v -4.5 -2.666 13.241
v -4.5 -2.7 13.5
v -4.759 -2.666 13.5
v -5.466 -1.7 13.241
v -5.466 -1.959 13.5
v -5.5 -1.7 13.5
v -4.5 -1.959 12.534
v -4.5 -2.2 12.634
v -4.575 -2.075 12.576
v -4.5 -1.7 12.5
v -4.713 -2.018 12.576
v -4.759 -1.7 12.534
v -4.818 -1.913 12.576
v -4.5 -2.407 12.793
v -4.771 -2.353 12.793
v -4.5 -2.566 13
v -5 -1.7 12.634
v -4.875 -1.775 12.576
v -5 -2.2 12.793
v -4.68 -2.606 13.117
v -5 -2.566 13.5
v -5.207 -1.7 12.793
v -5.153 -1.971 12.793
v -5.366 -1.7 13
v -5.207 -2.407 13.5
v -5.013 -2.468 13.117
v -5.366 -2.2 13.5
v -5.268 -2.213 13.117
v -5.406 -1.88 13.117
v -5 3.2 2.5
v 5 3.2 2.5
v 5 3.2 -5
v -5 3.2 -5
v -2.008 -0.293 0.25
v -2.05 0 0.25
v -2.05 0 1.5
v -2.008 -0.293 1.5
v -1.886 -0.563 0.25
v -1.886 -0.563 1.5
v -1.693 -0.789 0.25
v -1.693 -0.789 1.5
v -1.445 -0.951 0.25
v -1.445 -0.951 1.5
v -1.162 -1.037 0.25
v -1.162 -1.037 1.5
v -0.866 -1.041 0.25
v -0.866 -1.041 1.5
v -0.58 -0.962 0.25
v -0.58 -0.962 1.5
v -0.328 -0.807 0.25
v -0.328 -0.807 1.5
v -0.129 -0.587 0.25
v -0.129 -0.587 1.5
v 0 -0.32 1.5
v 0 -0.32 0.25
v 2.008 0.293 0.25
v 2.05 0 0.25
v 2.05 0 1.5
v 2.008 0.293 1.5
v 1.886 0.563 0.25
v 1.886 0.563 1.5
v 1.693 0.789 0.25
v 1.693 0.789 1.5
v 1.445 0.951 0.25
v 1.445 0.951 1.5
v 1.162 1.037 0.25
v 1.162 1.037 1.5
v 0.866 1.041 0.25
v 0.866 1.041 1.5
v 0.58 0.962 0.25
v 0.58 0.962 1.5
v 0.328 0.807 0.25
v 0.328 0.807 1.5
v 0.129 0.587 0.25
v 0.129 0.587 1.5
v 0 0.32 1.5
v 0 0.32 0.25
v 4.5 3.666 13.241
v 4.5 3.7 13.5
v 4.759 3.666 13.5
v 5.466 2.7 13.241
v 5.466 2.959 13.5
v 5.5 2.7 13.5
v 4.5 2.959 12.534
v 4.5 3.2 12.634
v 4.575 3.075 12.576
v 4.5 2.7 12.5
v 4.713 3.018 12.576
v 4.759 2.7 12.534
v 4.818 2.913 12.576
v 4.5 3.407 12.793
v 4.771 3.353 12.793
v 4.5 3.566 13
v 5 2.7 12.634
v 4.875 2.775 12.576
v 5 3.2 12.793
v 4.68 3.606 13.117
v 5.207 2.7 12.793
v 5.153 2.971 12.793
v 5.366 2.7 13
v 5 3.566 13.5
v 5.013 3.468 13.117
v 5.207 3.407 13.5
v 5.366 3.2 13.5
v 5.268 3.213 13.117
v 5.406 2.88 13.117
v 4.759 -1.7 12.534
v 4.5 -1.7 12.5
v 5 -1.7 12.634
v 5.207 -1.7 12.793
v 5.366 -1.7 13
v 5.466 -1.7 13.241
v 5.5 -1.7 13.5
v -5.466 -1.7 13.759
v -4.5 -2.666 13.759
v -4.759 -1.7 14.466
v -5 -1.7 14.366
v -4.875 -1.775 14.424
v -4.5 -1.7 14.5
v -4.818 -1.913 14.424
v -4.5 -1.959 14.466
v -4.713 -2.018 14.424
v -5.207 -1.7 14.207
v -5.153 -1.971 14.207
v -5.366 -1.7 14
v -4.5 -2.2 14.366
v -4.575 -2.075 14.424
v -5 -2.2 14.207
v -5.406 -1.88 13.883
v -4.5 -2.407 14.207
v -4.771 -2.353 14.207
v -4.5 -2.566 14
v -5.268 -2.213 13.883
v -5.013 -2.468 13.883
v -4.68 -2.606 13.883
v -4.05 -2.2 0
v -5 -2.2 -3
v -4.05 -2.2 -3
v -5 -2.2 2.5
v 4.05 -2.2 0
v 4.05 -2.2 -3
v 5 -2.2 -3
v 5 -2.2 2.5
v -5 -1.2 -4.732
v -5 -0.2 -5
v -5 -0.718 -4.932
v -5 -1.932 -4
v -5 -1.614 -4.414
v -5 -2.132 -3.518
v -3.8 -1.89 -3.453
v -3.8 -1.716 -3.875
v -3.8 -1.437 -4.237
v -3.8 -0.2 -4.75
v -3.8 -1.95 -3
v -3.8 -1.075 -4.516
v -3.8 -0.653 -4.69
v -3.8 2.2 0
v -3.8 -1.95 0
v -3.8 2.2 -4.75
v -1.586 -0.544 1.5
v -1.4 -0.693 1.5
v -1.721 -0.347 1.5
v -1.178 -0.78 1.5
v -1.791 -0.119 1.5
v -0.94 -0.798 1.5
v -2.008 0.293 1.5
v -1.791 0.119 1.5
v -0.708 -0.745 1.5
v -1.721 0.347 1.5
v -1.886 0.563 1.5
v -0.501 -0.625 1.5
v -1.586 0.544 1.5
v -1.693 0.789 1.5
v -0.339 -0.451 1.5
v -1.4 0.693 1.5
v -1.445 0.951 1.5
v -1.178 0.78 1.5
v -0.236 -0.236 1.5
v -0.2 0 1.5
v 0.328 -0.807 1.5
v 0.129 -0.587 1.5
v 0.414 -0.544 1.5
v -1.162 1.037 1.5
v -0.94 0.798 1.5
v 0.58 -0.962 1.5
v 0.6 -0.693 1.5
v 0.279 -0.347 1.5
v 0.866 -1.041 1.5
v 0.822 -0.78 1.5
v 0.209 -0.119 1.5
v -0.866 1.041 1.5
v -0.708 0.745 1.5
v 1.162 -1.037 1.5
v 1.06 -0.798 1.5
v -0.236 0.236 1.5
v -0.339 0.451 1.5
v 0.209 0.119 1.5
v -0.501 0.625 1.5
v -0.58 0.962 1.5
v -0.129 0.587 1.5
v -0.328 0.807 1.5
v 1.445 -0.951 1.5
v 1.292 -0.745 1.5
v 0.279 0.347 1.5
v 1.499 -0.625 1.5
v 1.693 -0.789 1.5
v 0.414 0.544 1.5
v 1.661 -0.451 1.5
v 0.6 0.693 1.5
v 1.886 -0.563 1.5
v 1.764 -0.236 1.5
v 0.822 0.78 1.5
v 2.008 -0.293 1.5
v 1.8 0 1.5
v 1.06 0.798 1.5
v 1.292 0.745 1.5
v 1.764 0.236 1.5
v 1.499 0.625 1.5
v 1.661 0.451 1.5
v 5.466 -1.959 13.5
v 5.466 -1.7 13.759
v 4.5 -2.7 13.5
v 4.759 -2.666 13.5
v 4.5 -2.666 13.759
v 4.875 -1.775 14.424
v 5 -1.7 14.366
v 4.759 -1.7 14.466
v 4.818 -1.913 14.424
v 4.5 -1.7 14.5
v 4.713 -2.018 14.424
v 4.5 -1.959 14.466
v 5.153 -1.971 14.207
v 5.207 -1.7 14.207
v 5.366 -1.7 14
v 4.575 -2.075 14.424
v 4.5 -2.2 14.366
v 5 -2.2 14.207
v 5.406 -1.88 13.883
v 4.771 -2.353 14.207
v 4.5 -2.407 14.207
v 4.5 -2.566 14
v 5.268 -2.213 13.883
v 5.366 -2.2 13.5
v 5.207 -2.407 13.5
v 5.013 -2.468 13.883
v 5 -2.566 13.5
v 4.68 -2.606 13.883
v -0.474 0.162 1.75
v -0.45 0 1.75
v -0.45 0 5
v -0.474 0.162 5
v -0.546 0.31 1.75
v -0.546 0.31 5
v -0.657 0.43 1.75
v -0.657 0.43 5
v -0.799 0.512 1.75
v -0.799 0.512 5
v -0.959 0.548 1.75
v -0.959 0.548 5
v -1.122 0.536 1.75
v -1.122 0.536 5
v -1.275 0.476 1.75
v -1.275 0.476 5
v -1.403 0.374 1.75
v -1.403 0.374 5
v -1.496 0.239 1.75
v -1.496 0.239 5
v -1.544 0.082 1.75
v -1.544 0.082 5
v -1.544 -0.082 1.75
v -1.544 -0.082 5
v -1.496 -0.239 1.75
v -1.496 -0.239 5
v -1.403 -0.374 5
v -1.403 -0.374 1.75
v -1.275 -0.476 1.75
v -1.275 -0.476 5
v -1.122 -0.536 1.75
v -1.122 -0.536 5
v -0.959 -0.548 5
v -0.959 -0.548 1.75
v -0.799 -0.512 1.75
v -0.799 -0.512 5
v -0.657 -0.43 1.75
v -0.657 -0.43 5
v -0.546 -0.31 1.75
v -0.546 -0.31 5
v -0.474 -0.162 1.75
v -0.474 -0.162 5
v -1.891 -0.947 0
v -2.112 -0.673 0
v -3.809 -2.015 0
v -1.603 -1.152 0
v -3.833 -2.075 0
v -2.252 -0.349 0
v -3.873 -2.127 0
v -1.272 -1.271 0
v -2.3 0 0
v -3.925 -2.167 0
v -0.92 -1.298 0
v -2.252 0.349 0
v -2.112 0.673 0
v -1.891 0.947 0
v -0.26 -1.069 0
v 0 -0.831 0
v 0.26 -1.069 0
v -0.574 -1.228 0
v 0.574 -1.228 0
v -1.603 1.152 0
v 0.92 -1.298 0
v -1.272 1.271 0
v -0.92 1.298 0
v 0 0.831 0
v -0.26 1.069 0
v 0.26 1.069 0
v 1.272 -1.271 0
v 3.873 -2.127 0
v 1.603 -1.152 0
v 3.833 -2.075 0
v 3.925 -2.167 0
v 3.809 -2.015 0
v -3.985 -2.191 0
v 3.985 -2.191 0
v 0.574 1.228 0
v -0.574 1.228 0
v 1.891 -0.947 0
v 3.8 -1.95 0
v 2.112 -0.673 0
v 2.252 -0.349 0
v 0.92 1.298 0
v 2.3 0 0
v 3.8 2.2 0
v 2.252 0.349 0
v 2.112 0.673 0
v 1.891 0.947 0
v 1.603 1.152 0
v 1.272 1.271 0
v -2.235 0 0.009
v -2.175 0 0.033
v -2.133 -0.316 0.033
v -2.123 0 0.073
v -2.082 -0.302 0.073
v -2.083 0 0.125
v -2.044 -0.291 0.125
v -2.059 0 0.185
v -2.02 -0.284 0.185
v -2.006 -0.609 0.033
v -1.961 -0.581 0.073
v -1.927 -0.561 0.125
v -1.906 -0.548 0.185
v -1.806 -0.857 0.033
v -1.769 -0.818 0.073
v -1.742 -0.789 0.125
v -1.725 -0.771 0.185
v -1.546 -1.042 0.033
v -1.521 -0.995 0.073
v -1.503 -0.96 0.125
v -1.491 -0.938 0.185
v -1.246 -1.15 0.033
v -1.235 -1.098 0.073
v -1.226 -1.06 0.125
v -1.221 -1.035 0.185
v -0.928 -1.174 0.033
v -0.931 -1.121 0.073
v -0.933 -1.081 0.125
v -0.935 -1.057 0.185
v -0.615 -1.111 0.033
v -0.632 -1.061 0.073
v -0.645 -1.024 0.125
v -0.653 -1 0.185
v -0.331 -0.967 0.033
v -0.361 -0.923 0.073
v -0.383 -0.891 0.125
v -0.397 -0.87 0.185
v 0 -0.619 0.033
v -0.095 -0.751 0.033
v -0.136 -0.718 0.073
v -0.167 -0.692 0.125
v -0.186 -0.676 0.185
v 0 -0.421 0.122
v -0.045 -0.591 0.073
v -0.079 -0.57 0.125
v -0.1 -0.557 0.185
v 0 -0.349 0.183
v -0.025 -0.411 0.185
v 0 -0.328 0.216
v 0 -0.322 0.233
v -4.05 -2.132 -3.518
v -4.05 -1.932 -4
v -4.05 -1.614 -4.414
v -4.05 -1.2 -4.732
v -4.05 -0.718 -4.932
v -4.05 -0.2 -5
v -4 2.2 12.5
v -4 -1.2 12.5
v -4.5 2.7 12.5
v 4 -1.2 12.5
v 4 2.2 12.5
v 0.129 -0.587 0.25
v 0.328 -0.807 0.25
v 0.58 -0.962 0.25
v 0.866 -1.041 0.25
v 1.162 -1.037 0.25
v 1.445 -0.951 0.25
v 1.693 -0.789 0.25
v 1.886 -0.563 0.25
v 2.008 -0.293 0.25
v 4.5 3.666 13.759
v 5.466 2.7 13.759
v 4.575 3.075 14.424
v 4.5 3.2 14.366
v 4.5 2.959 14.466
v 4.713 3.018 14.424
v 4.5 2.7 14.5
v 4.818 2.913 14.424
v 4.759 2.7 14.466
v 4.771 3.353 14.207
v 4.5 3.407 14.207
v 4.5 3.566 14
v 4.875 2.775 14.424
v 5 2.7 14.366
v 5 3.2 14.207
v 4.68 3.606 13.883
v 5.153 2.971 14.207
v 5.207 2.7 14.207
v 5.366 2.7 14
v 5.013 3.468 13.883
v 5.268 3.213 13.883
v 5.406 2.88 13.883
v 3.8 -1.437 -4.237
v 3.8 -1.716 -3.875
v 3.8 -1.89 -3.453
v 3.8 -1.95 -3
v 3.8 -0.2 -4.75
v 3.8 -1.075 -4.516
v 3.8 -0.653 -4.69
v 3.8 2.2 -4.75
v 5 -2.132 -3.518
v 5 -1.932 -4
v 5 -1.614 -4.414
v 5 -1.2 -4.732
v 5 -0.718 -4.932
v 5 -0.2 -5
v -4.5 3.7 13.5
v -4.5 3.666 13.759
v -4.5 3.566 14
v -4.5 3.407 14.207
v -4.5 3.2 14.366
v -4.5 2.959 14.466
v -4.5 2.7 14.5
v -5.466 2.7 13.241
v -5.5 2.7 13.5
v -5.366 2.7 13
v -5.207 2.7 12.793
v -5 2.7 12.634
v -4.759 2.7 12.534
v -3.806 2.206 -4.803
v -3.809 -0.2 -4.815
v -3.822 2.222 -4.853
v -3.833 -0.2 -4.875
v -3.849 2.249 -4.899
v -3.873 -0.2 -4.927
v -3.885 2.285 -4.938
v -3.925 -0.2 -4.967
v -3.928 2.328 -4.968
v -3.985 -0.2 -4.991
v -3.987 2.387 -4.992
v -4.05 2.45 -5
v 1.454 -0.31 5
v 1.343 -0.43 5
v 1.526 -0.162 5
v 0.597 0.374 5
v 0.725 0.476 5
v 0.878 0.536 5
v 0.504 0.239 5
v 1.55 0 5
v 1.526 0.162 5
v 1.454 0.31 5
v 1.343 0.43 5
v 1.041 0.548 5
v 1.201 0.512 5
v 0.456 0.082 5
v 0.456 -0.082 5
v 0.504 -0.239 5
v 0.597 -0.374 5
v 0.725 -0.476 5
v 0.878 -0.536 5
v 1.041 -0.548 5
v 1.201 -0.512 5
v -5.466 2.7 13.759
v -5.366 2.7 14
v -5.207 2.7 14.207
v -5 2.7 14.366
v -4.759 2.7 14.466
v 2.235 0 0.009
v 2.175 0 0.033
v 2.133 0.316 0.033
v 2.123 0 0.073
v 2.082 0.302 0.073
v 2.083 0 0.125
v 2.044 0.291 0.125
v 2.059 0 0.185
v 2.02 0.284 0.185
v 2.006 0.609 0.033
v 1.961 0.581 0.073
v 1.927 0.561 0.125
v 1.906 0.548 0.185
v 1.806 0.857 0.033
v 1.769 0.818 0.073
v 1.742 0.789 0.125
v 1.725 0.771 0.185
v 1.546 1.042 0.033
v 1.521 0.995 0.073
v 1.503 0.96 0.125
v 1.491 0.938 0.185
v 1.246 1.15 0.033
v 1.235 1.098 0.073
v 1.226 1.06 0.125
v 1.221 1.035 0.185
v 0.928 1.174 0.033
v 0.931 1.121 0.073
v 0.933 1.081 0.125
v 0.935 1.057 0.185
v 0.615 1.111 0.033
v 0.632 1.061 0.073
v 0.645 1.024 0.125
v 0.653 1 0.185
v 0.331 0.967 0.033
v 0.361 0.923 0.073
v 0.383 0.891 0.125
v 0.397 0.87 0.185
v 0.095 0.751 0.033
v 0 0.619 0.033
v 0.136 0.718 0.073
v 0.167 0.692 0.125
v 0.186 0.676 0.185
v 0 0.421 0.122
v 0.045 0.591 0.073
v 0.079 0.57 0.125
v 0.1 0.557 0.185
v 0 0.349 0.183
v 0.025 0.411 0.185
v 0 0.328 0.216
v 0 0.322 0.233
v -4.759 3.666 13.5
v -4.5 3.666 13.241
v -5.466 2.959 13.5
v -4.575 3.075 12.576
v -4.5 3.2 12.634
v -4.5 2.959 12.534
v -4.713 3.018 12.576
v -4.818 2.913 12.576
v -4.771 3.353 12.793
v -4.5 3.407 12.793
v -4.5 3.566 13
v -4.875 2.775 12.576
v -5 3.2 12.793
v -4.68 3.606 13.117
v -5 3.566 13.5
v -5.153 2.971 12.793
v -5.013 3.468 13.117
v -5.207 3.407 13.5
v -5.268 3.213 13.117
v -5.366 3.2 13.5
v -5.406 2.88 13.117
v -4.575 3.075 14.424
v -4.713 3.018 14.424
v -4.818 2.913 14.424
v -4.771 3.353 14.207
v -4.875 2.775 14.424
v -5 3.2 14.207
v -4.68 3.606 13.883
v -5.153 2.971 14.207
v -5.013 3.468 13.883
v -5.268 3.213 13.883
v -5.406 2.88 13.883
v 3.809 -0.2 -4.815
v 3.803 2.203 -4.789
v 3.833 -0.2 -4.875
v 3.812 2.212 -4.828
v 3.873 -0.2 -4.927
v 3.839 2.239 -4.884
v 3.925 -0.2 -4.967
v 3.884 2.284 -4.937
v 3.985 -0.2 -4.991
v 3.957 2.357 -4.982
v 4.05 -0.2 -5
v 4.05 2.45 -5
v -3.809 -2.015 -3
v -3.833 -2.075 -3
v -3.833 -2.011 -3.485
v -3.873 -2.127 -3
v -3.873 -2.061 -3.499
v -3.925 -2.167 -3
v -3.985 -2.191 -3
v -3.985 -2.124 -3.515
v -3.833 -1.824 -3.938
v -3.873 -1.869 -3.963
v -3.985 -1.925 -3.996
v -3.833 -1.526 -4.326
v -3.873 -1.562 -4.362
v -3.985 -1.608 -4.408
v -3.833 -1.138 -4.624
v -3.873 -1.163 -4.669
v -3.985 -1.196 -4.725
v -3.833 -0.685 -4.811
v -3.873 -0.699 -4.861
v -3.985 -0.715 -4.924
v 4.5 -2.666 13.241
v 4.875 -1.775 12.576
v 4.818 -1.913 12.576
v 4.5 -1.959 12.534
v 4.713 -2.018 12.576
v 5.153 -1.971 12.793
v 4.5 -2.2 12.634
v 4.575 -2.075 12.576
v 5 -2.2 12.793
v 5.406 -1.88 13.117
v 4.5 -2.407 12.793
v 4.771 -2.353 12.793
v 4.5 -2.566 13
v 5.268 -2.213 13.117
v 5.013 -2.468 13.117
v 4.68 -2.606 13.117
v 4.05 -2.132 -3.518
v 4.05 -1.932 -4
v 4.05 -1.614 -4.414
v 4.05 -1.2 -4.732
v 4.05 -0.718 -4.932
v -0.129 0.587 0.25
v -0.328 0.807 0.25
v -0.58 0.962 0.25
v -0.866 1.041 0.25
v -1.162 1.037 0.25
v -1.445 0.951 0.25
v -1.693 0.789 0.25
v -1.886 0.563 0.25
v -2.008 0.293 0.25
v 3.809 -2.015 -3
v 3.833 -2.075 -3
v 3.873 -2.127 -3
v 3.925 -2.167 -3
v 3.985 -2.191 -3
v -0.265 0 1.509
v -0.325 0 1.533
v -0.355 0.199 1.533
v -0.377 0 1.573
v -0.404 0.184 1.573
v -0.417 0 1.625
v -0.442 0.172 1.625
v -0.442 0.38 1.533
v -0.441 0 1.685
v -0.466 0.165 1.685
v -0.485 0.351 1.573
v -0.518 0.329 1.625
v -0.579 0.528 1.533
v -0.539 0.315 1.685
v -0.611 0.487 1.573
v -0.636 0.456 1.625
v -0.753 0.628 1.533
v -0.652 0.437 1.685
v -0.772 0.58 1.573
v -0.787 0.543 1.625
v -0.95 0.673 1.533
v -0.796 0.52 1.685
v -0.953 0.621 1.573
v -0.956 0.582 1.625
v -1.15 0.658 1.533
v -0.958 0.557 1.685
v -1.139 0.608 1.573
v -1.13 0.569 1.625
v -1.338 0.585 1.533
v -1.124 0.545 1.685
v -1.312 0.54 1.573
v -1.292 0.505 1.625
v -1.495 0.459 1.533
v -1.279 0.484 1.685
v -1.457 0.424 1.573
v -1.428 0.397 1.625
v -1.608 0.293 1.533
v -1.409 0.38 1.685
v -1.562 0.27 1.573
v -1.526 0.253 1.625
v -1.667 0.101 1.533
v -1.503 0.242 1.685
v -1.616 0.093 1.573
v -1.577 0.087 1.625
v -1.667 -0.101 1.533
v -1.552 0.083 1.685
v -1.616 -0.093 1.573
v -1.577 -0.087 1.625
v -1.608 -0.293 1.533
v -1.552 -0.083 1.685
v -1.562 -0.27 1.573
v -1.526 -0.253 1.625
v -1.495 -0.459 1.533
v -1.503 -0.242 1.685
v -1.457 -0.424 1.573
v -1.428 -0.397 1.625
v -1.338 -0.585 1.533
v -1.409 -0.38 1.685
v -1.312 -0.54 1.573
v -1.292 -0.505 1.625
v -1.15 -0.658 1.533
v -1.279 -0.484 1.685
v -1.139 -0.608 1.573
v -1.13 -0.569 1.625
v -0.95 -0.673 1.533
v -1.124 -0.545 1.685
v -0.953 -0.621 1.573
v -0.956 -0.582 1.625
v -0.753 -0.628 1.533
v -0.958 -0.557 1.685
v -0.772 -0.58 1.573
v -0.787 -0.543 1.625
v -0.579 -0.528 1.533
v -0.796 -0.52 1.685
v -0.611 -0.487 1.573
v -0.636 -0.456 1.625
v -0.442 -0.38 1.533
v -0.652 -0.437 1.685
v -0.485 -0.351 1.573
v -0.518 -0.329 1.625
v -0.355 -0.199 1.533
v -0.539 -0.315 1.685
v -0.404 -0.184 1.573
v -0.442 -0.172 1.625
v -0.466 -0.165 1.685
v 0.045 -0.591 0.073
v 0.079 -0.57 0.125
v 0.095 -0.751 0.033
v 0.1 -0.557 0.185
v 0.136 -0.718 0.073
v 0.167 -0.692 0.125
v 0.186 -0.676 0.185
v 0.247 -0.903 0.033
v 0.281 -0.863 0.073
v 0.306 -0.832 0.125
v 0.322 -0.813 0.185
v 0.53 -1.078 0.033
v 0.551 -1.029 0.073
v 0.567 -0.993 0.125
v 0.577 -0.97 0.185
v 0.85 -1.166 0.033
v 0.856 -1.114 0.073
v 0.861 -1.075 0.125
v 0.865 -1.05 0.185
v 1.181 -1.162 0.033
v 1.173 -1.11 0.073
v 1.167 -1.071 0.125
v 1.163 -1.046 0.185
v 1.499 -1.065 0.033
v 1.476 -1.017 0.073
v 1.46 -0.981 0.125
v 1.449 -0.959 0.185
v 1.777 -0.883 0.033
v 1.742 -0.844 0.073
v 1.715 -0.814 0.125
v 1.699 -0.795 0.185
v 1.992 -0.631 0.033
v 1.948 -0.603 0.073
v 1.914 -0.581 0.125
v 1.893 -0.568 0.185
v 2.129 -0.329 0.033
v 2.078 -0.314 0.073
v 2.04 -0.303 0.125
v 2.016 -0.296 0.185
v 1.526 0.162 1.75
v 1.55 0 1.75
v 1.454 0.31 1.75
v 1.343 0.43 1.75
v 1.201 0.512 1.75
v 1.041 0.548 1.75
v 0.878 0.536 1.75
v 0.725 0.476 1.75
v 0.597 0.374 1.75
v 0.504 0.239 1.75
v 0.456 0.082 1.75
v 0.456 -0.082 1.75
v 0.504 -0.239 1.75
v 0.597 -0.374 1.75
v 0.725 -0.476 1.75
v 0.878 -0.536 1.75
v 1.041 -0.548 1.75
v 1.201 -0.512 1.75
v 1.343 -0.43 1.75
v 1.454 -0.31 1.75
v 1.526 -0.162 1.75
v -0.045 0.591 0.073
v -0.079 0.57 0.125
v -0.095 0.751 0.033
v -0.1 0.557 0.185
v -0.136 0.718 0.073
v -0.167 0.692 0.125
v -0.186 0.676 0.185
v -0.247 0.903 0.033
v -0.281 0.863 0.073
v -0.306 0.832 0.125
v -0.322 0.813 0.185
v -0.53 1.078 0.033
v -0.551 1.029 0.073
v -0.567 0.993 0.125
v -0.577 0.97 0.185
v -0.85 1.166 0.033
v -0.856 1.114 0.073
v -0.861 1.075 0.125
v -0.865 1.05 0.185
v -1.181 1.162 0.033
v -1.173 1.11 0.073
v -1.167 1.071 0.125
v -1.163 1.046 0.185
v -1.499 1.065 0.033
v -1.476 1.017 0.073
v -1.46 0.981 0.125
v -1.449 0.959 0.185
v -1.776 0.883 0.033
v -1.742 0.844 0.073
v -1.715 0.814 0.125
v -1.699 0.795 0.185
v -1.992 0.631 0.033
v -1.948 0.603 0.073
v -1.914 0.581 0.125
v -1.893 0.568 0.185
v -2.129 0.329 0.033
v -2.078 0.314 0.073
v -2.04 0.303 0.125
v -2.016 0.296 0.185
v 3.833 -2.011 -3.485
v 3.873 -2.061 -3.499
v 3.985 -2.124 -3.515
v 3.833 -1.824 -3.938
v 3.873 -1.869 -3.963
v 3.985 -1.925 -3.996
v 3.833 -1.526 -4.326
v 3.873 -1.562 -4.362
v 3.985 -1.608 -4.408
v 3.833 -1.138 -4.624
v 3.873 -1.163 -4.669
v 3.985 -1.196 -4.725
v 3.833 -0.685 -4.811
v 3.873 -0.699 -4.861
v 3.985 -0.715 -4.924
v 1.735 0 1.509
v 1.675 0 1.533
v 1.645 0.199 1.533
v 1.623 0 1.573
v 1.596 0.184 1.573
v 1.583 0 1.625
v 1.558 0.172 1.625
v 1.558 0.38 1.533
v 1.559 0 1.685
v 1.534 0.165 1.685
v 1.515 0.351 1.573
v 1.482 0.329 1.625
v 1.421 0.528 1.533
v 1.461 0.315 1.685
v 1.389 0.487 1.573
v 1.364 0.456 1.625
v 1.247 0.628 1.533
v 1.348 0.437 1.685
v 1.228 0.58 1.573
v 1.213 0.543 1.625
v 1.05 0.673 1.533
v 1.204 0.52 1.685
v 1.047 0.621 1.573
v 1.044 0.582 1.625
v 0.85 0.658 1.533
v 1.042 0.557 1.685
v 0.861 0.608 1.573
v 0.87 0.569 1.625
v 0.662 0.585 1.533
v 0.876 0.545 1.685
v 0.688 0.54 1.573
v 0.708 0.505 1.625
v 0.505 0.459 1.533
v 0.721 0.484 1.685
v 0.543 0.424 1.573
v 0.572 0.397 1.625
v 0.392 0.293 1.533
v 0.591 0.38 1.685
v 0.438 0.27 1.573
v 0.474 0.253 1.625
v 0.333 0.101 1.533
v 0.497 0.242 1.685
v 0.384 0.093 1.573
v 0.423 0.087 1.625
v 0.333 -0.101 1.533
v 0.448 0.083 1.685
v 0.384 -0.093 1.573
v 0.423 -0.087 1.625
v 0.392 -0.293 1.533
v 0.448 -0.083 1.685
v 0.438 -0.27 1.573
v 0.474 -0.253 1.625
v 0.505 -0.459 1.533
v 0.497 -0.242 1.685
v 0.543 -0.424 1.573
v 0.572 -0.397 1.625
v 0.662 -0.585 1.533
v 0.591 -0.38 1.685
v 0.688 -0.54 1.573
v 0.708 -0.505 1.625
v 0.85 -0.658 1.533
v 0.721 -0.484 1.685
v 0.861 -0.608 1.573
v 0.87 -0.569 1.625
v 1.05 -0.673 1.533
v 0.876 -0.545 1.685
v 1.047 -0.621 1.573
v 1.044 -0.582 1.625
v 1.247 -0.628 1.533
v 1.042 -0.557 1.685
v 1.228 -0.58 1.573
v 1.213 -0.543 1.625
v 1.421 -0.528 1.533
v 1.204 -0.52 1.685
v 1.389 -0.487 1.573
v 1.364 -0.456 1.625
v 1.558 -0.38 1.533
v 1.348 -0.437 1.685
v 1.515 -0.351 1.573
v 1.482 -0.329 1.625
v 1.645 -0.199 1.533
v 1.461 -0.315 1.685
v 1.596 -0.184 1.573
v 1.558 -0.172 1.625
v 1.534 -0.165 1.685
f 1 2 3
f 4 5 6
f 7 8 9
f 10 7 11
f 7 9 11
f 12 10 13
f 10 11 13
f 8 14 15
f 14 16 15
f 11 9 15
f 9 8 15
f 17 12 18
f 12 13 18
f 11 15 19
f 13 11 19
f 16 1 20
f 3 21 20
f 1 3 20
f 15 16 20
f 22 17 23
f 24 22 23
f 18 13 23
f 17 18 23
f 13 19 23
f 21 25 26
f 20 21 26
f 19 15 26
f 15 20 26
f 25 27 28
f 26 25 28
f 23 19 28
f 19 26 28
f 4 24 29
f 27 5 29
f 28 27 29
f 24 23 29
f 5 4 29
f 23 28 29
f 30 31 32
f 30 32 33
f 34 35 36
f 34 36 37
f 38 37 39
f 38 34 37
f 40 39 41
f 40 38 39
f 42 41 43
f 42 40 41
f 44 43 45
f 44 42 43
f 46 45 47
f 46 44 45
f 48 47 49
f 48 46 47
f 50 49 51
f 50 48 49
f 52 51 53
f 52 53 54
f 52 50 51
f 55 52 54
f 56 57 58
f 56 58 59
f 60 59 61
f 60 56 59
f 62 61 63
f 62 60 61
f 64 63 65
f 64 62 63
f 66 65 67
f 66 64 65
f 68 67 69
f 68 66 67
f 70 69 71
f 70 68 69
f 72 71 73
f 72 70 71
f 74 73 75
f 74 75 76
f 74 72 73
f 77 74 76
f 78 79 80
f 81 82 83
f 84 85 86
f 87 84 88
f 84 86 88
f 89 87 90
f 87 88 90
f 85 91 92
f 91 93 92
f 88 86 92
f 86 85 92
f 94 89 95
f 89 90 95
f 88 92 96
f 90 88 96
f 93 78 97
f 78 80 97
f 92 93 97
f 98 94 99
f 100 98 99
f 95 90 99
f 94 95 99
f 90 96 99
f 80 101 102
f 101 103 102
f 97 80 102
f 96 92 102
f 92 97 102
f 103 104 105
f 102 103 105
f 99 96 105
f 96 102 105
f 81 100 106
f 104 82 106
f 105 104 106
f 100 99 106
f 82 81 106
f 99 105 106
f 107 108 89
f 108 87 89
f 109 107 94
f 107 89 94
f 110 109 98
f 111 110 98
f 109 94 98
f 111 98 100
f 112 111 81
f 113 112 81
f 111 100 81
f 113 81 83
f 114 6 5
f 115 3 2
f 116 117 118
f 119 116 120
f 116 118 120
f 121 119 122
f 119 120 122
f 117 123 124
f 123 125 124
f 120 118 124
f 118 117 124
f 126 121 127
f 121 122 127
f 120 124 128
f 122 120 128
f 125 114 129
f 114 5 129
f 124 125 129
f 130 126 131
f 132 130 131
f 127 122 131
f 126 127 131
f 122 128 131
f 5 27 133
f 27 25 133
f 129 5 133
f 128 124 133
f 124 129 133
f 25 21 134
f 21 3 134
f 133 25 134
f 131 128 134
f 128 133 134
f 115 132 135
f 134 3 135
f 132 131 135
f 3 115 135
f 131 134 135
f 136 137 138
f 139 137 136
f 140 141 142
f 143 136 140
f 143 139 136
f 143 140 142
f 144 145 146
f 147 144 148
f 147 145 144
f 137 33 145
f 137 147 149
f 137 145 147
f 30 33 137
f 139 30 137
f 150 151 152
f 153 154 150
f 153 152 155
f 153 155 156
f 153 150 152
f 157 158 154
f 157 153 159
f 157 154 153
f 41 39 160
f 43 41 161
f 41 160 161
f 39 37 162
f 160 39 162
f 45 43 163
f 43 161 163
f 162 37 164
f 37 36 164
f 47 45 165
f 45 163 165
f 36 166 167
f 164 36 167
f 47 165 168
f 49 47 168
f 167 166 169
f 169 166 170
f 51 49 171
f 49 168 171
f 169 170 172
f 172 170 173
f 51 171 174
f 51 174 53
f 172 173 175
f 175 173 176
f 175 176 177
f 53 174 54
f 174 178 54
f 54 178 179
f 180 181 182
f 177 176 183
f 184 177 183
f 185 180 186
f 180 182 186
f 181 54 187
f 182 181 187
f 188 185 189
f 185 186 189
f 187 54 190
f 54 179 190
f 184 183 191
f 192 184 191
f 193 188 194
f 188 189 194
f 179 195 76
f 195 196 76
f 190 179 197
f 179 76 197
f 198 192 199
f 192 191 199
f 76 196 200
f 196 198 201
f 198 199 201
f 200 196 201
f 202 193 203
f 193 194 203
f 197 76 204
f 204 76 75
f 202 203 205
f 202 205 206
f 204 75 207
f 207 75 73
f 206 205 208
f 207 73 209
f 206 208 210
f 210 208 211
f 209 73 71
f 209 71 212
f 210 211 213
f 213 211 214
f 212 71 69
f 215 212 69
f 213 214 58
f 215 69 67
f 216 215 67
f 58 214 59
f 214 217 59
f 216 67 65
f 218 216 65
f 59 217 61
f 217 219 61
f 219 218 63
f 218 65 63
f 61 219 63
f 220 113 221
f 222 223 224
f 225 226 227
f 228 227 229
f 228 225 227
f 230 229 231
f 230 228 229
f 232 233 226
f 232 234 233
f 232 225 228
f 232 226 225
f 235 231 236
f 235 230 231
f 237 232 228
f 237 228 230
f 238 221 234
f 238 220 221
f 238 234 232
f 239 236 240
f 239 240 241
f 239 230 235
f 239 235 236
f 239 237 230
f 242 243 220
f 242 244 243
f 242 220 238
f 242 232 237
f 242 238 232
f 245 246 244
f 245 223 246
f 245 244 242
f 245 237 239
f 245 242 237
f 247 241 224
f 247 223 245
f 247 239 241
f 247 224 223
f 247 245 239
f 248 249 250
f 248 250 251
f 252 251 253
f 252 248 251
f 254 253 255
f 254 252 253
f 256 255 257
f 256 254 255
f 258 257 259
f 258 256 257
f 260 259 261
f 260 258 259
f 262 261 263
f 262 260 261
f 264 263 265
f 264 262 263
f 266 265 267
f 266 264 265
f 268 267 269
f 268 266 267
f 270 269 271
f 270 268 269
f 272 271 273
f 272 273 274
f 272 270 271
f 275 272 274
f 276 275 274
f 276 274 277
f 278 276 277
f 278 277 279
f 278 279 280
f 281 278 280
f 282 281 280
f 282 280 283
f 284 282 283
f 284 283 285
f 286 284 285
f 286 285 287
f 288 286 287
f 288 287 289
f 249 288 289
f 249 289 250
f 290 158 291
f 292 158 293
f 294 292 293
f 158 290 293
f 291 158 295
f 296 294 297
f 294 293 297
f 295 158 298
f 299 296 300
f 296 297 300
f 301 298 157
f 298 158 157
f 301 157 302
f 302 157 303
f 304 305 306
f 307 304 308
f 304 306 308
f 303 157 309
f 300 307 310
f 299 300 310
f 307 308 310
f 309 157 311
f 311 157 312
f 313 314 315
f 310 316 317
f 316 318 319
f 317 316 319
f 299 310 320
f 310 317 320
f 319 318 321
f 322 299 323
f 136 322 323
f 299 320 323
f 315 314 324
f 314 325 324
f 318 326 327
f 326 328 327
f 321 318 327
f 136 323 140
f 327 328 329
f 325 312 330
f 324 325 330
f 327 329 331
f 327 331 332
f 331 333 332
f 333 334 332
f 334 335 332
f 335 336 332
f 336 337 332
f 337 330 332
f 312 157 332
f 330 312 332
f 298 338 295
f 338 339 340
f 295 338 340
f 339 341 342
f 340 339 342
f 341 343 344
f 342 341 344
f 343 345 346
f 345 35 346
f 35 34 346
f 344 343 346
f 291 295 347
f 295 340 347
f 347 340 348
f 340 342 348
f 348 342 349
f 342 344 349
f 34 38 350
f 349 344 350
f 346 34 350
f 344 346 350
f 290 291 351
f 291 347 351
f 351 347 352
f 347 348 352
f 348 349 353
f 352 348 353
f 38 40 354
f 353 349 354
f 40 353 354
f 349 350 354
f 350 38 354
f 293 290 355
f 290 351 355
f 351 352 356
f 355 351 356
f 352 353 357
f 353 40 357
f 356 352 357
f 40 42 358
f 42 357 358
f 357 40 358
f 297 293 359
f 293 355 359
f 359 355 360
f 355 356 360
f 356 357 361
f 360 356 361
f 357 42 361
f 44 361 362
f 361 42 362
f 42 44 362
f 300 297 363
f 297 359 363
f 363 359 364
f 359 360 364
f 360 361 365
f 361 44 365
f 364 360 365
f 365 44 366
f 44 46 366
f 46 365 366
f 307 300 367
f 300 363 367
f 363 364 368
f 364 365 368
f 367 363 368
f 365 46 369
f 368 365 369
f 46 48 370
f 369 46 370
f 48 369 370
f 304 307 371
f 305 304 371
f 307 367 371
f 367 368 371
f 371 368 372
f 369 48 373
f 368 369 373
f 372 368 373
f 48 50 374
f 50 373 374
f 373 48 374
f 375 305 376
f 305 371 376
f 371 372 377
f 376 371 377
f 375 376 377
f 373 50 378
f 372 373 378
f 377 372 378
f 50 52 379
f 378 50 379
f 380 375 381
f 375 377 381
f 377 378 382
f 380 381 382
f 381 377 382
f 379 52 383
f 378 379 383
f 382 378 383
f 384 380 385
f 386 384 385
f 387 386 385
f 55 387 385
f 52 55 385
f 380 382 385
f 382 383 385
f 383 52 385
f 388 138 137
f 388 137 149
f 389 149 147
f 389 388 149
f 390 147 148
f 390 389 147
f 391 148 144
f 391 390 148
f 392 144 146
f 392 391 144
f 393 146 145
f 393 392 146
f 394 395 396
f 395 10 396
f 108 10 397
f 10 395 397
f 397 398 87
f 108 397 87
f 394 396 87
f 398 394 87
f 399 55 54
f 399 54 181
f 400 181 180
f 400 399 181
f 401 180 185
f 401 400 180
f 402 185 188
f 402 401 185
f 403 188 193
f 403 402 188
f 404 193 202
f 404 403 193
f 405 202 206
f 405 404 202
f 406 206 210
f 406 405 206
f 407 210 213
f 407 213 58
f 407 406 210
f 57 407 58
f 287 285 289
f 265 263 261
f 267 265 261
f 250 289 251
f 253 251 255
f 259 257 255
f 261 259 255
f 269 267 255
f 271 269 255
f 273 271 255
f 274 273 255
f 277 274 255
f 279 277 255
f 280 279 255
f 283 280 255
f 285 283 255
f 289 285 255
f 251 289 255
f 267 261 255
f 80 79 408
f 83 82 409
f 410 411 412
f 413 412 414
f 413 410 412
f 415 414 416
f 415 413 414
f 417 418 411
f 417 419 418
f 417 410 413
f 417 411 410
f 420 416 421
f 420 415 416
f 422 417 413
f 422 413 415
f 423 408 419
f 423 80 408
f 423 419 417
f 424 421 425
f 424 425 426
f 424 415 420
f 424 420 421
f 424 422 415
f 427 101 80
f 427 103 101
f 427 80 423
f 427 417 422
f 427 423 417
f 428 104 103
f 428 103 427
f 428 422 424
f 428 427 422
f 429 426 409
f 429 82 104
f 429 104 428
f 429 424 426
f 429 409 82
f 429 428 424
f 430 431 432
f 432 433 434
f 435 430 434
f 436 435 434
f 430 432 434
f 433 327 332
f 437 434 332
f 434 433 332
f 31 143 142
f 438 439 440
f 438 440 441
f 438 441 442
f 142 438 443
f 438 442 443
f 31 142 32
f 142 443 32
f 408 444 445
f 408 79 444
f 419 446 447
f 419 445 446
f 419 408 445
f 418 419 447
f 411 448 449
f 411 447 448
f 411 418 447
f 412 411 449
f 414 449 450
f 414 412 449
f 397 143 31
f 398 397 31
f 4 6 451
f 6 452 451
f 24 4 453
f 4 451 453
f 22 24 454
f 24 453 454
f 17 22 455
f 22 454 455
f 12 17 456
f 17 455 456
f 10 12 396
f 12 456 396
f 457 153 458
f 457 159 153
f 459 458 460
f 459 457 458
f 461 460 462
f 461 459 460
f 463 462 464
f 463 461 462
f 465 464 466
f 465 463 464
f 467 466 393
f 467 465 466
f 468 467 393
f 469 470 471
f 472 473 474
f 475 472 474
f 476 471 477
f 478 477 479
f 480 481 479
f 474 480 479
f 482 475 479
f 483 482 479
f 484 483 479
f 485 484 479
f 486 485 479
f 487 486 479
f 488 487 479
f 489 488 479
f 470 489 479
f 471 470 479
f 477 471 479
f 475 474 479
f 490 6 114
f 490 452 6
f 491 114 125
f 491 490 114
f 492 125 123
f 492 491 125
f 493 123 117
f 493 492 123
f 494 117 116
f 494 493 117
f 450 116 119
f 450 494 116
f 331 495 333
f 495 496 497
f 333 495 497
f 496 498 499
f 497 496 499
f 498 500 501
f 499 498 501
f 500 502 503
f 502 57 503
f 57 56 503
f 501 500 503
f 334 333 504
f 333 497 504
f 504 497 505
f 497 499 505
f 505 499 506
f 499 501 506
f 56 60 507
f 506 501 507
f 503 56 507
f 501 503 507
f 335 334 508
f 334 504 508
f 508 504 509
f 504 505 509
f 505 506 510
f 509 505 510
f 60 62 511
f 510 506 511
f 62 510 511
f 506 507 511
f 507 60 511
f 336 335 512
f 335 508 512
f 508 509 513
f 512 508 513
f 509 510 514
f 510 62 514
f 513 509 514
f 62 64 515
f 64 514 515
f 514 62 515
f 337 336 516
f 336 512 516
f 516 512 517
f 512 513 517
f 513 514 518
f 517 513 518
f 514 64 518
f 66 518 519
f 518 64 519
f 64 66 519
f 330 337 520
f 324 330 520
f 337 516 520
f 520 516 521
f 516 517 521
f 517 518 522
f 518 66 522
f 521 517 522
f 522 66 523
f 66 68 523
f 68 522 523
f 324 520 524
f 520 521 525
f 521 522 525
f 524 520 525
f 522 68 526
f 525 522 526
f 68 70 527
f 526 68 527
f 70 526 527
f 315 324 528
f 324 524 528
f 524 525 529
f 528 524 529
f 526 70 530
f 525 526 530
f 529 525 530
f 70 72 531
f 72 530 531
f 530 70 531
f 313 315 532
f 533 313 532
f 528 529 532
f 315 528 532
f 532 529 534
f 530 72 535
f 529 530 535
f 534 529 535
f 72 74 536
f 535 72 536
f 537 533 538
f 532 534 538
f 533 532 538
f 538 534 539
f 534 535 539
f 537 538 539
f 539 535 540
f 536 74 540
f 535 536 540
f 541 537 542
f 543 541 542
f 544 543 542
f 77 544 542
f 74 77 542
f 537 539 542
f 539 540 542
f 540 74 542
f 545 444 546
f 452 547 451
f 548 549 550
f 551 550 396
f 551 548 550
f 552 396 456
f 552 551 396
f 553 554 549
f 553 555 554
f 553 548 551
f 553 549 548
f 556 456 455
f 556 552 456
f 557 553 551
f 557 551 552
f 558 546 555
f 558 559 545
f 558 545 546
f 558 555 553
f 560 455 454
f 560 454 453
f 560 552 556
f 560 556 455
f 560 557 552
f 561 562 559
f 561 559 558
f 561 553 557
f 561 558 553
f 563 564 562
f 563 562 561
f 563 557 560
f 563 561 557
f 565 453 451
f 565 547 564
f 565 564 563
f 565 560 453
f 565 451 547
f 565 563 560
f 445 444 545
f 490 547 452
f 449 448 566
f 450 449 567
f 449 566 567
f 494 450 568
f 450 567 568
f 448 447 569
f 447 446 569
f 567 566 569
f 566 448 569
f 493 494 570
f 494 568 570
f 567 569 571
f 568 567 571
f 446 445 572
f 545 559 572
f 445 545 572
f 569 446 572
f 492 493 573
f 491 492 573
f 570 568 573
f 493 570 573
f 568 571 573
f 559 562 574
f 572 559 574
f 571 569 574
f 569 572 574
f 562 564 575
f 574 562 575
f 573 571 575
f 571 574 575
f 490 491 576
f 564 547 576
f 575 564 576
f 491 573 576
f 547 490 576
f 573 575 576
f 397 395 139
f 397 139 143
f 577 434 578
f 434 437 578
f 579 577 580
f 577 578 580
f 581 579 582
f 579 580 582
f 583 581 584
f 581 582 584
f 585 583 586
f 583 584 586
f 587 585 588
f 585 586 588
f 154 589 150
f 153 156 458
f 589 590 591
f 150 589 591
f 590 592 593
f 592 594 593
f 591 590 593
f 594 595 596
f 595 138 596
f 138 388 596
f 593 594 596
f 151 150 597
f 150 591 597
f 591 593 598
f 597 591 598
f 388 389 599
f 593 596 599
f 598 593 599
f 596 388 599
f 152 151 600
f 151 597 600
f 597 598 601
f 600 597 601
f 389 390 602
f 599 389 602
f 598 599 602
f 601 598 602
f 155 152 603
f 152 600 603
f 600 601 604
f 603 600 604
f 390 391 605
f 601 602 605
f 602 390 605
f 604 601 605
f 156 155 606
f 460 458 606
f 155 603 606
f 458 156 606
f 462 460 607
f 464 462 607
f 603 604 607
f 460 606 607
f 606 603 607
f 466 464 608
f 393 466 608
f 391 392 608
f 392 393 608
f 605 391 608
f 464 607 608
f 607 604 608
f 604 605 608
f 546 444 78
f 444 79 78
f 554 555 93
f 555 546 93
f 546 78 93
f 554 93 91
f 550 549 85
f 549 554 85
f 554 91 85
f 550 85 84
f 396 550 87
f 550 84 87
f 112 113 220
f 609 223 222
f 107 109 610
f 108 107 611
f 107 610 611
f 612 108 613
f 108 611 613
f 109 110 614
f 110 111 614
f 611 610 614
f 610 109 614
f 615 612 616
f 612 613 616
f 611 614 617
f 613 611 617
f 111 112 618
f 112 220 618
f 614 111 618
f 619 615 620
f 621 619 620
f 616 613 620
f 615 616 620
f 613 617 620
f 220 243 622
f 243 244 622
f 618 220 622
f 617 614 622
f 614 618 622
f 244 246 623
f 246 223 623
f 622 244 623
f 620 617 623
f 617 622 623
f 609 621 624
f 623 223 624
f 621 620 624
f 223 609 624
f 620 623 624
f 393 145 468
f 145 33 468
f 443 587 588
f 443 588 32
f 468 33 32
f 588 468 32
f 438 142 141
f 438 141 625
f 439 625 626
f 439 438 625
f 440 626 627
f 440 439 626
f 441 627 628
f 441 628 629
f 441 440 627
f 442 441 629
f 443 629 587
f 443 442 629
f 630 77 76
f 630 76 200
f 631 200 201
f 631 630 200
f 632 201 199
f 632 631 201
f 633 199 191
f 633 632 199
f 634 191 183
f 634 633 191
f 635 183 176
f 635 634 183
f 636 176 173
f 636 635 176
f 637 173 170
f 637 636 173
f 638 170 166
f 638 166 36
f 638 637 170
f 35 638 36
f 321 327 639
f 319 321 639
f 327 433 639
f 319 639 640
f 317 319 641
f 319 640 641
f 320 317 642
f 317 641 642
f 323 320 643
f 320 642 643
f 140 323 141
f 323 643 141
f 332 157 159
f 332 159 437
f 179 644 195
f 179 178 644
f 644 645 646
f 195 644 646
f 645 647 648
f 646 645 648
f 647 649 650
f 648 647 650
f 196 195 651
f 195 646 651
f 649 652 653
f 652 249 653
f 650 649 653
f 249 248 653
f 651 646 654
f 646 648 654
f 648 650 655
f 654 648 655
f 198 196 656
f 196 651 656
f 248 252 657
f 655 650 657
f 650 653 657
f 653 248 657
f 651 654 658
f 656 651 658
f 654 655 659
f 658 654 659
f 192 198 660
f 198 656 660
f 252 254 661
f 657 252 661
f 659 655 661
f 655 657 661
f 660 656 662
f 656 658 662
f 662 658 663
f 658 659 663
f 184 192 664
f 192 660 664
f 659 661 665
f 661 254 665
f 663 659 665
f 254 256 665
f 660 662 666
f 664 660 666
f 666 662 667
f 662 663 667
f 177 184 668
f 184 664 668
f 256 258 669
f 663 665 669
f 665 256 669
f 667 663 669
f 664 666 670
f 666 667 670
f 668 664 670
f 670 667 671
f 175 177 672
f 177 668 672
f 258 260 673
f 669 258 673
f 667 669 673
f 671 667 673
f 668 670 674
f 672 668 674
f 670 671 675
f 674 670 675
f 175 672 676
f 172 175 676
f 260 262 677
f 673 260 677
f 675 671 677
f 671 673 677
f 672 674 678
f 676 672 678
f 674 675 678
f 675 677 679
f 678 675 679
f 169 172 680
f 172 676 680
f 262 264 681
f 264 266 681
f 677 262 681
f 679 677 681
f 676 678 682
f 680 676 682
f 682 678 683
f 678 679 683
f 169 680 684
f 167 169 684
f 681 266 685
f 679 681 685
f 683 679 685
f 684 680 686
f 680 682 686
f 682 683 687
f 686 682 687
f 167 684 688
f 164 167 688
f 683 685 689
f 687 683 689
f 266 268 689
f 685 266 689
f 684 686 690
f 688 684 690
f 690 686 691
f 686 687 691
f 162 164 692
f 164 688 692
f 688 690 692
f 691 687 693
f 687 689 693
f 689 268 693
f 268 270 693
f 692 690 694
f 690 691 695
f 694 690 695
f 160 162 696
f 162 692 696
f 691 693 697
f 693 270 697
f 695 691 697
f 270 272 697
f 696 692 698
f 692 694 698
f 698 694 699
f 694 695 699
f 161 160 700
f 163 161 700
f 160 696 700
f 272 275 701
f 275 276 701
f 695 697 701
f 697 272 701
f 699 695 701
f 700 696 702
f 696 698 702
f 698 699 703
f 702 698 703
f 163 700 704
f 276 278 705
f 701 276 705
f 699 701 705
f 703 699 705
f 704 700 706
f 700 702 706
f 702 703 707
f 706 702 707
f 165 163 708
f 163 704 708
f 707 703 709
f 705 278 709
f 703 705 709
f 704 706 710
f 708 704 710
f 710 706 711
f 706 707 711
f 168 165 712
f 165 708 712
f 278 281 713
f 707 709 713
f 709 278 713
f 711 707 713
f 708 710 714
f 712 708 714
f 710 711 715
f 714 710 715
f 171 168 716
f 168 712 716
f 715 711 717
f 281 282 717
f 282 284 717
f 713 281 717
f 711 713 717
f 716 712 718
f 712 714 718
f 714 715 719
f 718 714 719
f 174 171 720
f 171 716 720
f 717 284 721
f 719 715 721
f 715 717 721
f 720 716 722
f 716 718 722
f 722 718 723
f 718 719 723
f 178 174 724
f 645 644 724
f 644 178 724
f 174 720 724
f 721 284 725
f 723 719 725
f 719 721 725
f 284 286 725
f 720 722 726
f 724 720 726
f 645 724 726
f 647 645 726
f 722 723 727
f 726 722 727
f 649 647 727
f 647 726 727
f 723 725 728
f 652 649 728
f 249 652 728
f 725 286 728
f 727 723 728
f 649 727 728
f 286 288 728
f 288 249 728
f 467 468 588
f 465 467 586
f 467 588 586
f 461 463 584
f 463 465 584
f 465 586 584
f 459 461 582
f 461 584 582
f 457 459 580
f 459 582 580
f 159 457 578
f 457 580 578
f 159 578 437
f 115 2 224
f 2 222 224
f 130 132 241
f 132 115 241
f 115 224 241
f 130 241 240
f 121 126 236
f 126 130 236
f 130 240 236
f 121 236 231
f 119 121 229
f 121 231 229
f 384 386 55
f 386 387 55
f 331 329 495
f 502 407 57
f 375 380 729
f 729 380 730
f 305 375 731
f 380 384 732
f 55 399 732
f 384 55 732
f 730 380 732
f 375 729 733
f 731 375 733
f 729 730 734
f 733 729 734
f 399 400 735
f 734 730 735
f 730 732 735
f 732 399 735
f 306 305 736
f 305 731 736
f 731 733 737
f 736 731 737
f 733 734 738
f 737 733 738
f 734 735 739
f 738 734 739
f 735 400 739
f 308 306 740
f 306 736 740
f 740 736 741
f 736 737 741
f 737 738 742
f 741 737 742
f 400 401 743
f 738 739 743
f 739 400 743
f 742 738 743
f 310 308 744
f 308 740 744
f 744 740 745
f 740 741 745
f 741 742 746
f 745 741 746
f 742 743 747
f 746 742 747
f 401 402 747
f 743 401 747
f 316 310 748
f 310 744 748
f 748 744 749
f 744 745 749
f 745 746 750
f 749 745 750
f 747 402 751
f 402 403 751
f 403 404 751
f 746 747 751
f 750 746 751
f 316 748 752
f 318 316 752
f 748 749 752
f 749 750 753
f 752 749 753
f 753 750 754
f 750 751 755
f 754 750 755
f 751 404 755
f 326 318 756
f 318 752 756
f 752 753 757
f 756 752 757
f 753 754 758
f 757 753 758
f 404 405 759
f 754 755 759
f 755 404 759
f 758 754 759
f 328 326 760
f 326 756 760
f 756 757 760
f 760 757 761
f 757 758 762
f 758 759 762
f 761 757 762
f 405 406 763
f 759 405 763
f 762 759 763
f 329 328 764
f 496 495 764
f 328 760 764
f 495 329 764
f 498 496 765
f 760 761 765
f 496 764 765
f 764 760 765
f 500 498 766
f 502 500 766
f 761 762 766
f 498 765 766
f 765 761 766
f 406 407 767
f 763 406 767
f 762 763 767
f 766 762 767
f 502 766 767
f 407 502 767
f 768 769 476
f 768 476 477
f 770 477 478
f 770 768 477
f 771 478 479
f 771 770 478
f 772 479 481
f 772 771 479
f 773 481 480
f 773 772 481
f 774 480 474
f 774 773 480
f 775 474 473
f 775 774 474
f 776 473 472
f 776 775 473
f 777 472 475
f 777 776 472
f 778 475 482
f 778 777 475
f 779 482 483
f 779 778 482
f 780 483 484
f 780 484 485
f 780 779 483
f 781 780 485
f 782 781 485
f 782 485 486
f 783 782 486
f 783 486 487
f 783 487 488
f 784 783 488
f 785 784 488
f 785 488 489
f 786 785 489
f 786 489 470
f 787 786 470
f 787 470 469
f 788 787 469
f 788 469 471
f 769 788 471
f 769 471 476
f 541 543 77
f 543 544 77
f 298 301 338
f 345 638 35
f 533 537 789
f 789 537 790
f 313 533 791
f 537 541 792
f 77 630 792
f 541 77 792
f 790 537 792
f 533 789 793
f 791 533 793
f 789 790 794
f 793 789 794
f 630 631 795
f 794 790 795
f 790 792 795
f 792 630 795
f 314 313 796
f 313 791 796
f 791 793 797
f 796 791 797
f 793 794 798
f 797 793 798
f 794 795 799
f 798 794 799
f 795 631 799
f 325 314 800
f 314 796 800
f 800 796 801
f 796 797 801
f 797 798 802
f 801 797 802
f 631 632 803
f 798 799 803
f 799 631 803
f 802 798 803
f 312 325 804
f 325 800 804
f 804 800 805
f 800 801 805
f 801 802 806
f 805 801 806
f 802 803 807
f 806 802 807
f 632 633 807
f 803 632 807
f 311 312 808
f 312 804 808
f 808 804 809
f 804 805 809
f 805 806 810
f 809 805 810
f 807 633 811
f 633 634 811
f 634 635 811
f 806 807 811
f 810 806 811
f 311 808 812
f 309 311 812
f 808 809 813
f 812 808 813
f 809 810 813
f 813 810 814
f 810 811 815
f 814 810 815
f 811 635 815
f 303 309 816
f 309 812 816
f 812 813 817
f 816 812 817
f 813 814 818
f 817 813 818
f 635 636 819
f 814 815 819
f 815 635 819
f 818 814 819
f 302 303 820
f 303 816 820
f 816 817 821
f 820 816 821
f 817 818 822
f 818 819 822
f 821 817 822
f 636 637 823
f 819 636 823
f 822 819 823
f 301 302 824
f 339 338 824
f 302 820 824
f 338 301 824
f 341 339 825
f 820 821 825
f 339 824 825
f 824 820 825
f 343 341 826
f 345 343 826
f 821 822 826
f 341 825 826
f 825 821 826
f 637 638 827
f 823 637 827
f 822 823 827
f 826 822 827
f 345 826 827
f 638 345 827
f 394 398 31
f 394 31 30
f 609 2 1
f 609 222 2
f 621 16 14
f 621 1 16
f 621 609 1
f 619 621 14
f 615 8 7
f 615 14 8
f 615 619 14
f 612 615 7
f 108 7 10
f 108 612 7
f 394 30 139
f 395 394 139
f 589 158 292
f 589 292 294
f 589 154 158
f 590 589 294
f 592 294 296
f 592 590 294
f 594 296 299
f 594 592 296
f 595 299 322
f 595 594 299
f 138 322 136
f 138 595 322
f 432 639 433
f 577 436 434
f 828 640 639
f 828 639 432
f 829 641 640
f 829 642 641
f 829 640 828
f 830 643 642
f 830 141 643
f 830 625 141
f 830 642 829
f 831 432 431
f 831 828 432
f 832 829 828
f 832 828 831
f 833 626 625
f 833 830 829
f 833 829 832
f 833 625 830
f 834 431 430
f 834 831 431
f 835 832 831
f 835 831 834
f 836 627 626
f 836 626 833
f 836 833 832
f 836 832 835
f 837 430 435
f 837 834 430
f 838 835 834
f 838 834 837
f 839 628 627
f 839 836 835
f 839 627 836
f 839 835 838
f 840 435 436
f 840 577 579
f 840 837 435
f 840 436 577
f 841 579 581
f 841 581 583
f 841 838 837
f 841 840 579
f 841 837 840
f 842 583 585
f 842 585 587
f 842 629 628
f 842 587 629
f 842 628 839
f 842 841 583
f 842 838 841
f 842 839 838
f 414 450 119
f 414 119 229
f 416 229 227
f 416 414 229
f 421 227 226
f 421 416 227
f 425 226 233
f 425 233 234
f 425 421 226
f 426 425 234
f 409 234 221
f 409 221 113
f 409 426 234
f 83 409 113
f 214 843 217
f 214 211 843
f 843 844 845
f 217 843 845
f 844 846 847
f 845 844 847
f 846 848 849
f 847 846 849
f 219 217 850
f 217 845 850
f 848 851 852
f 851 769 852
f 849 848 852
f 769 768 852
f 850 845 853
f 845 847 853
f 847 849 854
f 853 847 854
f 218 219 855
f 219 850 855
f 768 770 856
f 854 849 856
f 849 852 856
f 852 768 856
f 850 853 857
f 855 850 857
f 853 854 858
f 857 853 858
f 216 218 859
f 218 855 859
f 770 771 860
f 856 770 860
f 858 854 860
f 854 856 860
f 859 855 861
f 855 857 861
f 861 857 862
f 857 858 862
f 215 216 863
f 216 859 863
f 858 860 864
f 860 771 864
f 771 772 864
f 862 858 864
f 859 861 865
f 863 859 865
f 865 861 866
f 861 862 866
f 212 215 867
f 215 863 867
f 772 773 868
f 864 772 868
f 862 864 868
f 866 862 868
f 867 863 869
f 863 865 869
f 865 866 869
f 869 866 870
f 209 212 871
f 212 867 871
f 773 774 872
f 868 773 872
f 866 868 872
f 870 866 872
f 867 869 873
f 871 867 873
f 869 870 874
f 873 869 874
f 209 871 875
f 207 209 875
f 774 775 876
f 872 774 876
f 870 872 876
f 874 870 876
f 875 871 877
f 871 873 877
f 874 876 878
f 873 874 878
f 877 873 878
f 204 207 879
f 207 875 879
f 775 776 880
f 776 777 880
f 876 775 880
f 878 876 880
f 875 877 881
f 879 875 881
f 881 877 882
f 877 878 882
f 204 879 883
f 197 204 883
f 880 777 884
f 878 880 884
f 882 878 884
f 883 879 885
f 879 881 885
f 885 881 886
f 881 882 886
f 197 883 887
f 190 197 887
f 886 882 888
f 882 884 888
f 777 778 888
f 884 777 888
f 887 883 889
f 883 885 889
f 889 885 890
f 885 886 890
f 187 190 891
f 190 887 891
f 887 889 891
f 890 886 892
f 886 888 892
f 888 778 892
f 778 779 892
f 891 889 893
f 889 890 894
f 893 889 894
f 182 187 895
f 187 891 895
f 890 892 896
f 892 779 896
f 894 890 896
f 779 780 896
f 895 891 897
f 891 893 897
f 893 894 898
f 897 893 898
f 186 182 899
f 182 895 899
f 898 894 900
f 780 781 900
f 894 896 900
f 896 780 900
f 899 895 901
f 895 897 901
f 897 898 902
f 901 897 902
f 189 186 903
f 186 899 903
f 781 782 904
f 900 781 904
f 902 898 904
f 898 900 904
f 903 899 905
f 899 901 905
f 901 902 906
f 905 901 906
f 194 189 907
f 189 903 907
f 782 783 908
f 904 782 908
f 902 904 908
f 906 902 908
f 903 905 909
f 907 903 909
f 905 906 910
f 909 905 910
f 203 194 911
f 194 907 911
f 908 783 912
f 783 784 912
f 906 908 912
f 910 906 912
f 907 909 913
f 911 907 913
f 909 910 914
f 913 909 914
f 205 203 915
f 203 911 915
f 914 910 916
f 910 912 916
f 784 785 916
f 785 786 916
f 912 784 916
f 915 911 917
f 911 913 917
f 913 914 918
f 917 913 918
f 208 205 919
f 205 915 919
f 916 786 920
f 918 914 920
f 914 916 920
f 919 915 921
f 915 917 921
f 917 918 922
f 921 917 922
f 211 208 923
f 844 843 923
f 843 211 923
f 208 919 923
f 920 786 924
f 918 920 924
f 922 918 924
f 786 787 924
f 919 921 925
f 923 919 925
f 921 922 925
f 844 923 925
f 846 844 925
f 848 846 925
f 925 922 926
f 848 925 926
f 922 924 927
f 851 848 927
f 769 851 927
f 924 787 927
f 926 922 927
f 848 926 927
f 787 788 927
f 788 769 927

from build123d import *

# Parameters (mm, degrees)
F0_W     = 1.2
F0_H     = 4.4
F0_W_2   = 7.6
F0_R     = 0.55
F1_DEPTH = 12.5
F2_DEPTH = 5
F3_DEPTH = 1.5
F4_DEPTH = 5
F5_R     = 2
F6_R     = 0.25
F7_SIZE2 = 10
F7_SIZE  = 1
F8_W     = 11.0000001401
F8_H     = 6.4000001401
F8_W_2   = 8
F8_H_2   = 3.4
F9_DEPTH = 2
F10_R    = 0.99999


# Not quite as in the source:
# - a fillet or chamfer is up to 0.001 mm smaller than in the source, because OpenCascade refuses the exact size


with BuildPart() as f1:
    # F0 (on Top) → F1 (new body)
    with BuildSketch(Plane.XY):
        Polygon((-5, 2.2), (-3.8, 2.2), (3.8, 2.2), (5, 2.2), (5, 3.2), (-5, 3.2), align=None)
        with Locations((-4.4, 0)):
            Rectangle(F0_W, F0_H)
        Rectangle(F0_W_2, F0_H)
        with BuildLine():
            Line((2.05, 1.05), (2.05, 0))
            Line((2.05, 0), (2.05, -1.05))
            ThreePointArc((2.05, -1.05), (2.2267766953, -1.4767766953), (1.8, -1.3))
            Line((1.8, -1.3), (-1.8, -1.3))
            ThreePointArc((-1.8, -1.3), (-2.2267766953, -1.4767766953), (-2.05, -1.05))
            Line((-2.05, -1.05), (-2.05, 0))
            Line((-2.05, 0), (-2.05, 1.05))
            ThreePointArc((-2.05, 1.05), (-2.2267766953, 1.4767766953), (-1.8, 1.3))
            Line((-1.8, 1.3), (1.8, 1.3))
            ThreePointArc((1.8, 1.3), (2.2267766953, 1.4767766953), (2.05, 1.05))
        make_face(mode=Mode.SUBTRACT)
        with Locations((4.4, 0)):
            Rectangle(F0_W, F0_H)
        with BuildLine():
            ThreePointArc((0, 0.3201562119), (1.1620185175, 1.0374246961), (2.05, 0))
            Line((2.05, 0), (2.05, 1.05))
            ThreePointArc((2.05, 1.05), (2.2267766953, 1.4767766953), (1.8, 1.3))
            Line((1.8, 1.3), (-1.8, 1.3))
            ThreePointArc((-1.8, 1.3), (-2.2267766953, 1.4767766953), (-2.05, 1.05))
            Line((-2.05, 1.05), (-2.05, 0))
            ThreePointArc((-2.05, 0), (-1.1620185175, 1.0374246961), (0, 0.3201562119))
        make_face()
        with BuildLine():
            Line((2.05, -1.05), (2.05, 0))
            ThreePointArc((2.05, 0), (1.1620185175, -1.0374246961), (0, -0.3201562119))
            ThreePointArc((0, -0.3201562119), (-1.1620185175, -1.0374246961), (-2.05, 0))
            Line((-2.05, 0), (-2.05, -1.05))
            ThreePointArc((-2.05, -1.05), (-2.2267766953, -1.4767766953), (-1.8, -1.3))
            Line((-1.8, -1.3), (1.8, -1.3))
            ThreePointArc((1.8, -1.3), (2.2267766953, -1.4767766953), (2.05, -1.05))
        make_face()
        with BuildLine():
            ThreePointArc((0, -0.3201562119), (-0.05, 0), (0, 0.3201562119))
            ThreePointArc((0, 0.3201562119), (-1.1620185175, 1.0374246961), (-2.05, 0))
            ThreePointArc((-2.05, 0), (-1.1620185175, -1.0374246961), (0, -0.3201562119))
        make_face()
        with Locations((-1, 0)):
            Circle(F0_R, mode=Mode.SUBTRACT)
        with BuildLine():
            ThreePointArc((0, -0.3201562119), (1.1620185175, -1.0374246961), (2.05, 0))
            ThreePointArc((2.05, 0), (1.1620185175, 1.0374246961), (0, 0.3201562119))
            ThreePointArc((0, 0.3201562119), (0.0374246961, 0.1620185175), (0.05, 0))
            ThreePointArc((0.05, 0), (0.0374246961, -0.1620185175), (0, -0.3201562119))
        make_face()
        with Locations((1, 0)):
            Circle(F0_R, mode=Mode.SUBTRACT)
        with Locations((-1, 0)):
            Circle(F0_R)
        with Locations((1, 0)):
            Circle(F0_R)
        with BuildLine():
            ThreePointArc((0.05, 0), (0.0374246961, 0.1620185175), (0, 0.3201562119))
            ThreePointArc((0, 0.3201562119), (-0.05, 0), (0, -0.3201562119))
            ThreePointArc((0, -0.3201562119), (0.0374246961, -0.1620185175), (0.05, 0))
        make_face()
    extrude(amount=F1_DEPTH)

    # F0 (on Top) → F2 (join)
    with BuildSketch(Plane.XY):
        with Locations((-4.4, 0)):
            Rectangle(F0_W, F0_H)
        with Locations((4.4, 0)):
            Rectangle(F0_W, F0_H)
        Polygon((-5, 2.2), (-3.8, 2.2), (3.8, 2.2), (5, 2.2), (5, 3.2), (-5, 3.2), align=None)
    extrude(amount=-F2_DEPTH)

    # F0 (on Top) → F3 (cut)
    with BuildSketch(Plane.XY):
        with BuildLine():
            ThreePointArc((0, -0.3201562119), (-0.05, 0), (0, 0.3201562119))
            ThreePointArc((0, 0.3201562119), (-1.1620185175, 1.0374246961), (-2.05, 0))
            ThreePointArc((-2.05, 0), (-1.1620185175, -1.0374246961), (0, -0.3201562119))
        make_face()
        with Locations((-1, 0)):
            Circle(F0_R, mode=Mode.SUBTRACT)
        with BuildLine():
            ThreePointArc((0, -0.3201562119), (1.1620185175, -1.0374246961), (2.05, 0))
            ThreePointArc((2.05, 0), (1.1620185175, 1.0374246961), (0, 0.3201562119))
            ThreePointArc((0, 0.3201562119), (0.0374246961, 0.1620185175), (0.05, 0))
            ThreePointArc((0.05, 0), (0.0374246961, -0.1620185175), (0, -0.3201562119))
        make_face()
        with Locations((1, 0)):
            Circle(F0_R, mode=Mode.SUBTRACT)
        with BuildLine():
            ThreePointArc((0.05, 0), (0.0374246961, 0.1620185175), (0, 0.3201562119))
            ThreePointArc((0, 0.3201562119), (-0.05, 0), (0, -0.3201562119))
            ThreePointArc((0, -0.3201562119), (0.0374246961, -0.1620185175), (0.05, 0))
        make_face()
    extrude(amount=F3_DEPTH, mode=Mode.SUBTRACT)

    # F0 (on Top) → F4 (cut)
    with BuildSketch(Plane.XY):
        with Locations((-1, 0)):
            Circle(F0_R)
        with Locations((1, 0)):
            Circle(F0_R)
    extrude(amount=F4_DEPTH, mode=Mode.SUBTRACT)

    # F5
    f5_edges = [f1.edges().sort_by_distance(p)[0] for p in [
        (4.4, -2.2, -5),
        (-4.4, -2.2, -5),
    ]]
    fillet(f5_edges, radius=F5_R)

    # F6
    f6_edges = [f1.edges().sort_by_distance(p)[0] for p in [
        (0.45, 0, 1.5),
        (2.05, 0, 0),
        (-1.55, 0, 1.5),
        (-2.05, 0, 0),
        (-3.8, 1, -5),
        (0, 2.2, -5),
        (3.8, 1, -5),
        (-3.8, -2.2, -1.5),
        (3.8, -2.2, -1.5),
    ]]
    fillet(f6_edges, radius=F6_R)

    # F7
    f7_edges = [f1.edges().sort_by_distance(p)[0] for p in [
        (0, -2.2, 12.5),
        (-5, 0.5, 12.5),
        (5, 0.5, 12.5),
        (0, 3.2, 12.5),
    ]]
    f7_side = f1.faces().sort_by_distance((0, 0.5, 12.5))[0]
    chamfer(f7_edges, length=F7_SIZE, length2=F7_SIZE2, reference=f7_side)

    # F8 (on face) → F9 (join)
    with BuildSketch(Plane.XY.offset(12.5)):
        with Locations((0, 0.5)):
            Rectangle(F8_W, F8_H)
        with Locations((0, 0.5)):
            Rectangle(F8_W_2, F8_H_2, mode=Mode.SUBTRACT)
        with Locations((0, 0.5)):
            Rectangle(F8_W_2, F8_H_2)
    extrude(amount=F9_DEPTH)

    # F10 (radius 1 in the source; OpenCascade refuses exactly that, so slightly less here)
    f10_edges = [f1.edges().sort_by_distance(p)[0] for p in [
        (5.5, -2.7, 13.5),
        (-5.5, -2.7, 13.5),
        (5.5, 3.7, 13.5),
        (-5.5, 3.7, 13.5),
        (0, 3.7, 12.5),
        (0, 3.7, 14.5),
        (-5.5, 0.5, 14.5),
        (5.5, 0.5, 14.5),
        (0, -2.7, 14.5),
        (5.5, 0.5, 12.5),
        (0, -2.7, 12.5),
        (-5.5, 0.5, 12.5),
    ]]
    fillet(f10_edges, radius=F10_R)


solid = f1.part
